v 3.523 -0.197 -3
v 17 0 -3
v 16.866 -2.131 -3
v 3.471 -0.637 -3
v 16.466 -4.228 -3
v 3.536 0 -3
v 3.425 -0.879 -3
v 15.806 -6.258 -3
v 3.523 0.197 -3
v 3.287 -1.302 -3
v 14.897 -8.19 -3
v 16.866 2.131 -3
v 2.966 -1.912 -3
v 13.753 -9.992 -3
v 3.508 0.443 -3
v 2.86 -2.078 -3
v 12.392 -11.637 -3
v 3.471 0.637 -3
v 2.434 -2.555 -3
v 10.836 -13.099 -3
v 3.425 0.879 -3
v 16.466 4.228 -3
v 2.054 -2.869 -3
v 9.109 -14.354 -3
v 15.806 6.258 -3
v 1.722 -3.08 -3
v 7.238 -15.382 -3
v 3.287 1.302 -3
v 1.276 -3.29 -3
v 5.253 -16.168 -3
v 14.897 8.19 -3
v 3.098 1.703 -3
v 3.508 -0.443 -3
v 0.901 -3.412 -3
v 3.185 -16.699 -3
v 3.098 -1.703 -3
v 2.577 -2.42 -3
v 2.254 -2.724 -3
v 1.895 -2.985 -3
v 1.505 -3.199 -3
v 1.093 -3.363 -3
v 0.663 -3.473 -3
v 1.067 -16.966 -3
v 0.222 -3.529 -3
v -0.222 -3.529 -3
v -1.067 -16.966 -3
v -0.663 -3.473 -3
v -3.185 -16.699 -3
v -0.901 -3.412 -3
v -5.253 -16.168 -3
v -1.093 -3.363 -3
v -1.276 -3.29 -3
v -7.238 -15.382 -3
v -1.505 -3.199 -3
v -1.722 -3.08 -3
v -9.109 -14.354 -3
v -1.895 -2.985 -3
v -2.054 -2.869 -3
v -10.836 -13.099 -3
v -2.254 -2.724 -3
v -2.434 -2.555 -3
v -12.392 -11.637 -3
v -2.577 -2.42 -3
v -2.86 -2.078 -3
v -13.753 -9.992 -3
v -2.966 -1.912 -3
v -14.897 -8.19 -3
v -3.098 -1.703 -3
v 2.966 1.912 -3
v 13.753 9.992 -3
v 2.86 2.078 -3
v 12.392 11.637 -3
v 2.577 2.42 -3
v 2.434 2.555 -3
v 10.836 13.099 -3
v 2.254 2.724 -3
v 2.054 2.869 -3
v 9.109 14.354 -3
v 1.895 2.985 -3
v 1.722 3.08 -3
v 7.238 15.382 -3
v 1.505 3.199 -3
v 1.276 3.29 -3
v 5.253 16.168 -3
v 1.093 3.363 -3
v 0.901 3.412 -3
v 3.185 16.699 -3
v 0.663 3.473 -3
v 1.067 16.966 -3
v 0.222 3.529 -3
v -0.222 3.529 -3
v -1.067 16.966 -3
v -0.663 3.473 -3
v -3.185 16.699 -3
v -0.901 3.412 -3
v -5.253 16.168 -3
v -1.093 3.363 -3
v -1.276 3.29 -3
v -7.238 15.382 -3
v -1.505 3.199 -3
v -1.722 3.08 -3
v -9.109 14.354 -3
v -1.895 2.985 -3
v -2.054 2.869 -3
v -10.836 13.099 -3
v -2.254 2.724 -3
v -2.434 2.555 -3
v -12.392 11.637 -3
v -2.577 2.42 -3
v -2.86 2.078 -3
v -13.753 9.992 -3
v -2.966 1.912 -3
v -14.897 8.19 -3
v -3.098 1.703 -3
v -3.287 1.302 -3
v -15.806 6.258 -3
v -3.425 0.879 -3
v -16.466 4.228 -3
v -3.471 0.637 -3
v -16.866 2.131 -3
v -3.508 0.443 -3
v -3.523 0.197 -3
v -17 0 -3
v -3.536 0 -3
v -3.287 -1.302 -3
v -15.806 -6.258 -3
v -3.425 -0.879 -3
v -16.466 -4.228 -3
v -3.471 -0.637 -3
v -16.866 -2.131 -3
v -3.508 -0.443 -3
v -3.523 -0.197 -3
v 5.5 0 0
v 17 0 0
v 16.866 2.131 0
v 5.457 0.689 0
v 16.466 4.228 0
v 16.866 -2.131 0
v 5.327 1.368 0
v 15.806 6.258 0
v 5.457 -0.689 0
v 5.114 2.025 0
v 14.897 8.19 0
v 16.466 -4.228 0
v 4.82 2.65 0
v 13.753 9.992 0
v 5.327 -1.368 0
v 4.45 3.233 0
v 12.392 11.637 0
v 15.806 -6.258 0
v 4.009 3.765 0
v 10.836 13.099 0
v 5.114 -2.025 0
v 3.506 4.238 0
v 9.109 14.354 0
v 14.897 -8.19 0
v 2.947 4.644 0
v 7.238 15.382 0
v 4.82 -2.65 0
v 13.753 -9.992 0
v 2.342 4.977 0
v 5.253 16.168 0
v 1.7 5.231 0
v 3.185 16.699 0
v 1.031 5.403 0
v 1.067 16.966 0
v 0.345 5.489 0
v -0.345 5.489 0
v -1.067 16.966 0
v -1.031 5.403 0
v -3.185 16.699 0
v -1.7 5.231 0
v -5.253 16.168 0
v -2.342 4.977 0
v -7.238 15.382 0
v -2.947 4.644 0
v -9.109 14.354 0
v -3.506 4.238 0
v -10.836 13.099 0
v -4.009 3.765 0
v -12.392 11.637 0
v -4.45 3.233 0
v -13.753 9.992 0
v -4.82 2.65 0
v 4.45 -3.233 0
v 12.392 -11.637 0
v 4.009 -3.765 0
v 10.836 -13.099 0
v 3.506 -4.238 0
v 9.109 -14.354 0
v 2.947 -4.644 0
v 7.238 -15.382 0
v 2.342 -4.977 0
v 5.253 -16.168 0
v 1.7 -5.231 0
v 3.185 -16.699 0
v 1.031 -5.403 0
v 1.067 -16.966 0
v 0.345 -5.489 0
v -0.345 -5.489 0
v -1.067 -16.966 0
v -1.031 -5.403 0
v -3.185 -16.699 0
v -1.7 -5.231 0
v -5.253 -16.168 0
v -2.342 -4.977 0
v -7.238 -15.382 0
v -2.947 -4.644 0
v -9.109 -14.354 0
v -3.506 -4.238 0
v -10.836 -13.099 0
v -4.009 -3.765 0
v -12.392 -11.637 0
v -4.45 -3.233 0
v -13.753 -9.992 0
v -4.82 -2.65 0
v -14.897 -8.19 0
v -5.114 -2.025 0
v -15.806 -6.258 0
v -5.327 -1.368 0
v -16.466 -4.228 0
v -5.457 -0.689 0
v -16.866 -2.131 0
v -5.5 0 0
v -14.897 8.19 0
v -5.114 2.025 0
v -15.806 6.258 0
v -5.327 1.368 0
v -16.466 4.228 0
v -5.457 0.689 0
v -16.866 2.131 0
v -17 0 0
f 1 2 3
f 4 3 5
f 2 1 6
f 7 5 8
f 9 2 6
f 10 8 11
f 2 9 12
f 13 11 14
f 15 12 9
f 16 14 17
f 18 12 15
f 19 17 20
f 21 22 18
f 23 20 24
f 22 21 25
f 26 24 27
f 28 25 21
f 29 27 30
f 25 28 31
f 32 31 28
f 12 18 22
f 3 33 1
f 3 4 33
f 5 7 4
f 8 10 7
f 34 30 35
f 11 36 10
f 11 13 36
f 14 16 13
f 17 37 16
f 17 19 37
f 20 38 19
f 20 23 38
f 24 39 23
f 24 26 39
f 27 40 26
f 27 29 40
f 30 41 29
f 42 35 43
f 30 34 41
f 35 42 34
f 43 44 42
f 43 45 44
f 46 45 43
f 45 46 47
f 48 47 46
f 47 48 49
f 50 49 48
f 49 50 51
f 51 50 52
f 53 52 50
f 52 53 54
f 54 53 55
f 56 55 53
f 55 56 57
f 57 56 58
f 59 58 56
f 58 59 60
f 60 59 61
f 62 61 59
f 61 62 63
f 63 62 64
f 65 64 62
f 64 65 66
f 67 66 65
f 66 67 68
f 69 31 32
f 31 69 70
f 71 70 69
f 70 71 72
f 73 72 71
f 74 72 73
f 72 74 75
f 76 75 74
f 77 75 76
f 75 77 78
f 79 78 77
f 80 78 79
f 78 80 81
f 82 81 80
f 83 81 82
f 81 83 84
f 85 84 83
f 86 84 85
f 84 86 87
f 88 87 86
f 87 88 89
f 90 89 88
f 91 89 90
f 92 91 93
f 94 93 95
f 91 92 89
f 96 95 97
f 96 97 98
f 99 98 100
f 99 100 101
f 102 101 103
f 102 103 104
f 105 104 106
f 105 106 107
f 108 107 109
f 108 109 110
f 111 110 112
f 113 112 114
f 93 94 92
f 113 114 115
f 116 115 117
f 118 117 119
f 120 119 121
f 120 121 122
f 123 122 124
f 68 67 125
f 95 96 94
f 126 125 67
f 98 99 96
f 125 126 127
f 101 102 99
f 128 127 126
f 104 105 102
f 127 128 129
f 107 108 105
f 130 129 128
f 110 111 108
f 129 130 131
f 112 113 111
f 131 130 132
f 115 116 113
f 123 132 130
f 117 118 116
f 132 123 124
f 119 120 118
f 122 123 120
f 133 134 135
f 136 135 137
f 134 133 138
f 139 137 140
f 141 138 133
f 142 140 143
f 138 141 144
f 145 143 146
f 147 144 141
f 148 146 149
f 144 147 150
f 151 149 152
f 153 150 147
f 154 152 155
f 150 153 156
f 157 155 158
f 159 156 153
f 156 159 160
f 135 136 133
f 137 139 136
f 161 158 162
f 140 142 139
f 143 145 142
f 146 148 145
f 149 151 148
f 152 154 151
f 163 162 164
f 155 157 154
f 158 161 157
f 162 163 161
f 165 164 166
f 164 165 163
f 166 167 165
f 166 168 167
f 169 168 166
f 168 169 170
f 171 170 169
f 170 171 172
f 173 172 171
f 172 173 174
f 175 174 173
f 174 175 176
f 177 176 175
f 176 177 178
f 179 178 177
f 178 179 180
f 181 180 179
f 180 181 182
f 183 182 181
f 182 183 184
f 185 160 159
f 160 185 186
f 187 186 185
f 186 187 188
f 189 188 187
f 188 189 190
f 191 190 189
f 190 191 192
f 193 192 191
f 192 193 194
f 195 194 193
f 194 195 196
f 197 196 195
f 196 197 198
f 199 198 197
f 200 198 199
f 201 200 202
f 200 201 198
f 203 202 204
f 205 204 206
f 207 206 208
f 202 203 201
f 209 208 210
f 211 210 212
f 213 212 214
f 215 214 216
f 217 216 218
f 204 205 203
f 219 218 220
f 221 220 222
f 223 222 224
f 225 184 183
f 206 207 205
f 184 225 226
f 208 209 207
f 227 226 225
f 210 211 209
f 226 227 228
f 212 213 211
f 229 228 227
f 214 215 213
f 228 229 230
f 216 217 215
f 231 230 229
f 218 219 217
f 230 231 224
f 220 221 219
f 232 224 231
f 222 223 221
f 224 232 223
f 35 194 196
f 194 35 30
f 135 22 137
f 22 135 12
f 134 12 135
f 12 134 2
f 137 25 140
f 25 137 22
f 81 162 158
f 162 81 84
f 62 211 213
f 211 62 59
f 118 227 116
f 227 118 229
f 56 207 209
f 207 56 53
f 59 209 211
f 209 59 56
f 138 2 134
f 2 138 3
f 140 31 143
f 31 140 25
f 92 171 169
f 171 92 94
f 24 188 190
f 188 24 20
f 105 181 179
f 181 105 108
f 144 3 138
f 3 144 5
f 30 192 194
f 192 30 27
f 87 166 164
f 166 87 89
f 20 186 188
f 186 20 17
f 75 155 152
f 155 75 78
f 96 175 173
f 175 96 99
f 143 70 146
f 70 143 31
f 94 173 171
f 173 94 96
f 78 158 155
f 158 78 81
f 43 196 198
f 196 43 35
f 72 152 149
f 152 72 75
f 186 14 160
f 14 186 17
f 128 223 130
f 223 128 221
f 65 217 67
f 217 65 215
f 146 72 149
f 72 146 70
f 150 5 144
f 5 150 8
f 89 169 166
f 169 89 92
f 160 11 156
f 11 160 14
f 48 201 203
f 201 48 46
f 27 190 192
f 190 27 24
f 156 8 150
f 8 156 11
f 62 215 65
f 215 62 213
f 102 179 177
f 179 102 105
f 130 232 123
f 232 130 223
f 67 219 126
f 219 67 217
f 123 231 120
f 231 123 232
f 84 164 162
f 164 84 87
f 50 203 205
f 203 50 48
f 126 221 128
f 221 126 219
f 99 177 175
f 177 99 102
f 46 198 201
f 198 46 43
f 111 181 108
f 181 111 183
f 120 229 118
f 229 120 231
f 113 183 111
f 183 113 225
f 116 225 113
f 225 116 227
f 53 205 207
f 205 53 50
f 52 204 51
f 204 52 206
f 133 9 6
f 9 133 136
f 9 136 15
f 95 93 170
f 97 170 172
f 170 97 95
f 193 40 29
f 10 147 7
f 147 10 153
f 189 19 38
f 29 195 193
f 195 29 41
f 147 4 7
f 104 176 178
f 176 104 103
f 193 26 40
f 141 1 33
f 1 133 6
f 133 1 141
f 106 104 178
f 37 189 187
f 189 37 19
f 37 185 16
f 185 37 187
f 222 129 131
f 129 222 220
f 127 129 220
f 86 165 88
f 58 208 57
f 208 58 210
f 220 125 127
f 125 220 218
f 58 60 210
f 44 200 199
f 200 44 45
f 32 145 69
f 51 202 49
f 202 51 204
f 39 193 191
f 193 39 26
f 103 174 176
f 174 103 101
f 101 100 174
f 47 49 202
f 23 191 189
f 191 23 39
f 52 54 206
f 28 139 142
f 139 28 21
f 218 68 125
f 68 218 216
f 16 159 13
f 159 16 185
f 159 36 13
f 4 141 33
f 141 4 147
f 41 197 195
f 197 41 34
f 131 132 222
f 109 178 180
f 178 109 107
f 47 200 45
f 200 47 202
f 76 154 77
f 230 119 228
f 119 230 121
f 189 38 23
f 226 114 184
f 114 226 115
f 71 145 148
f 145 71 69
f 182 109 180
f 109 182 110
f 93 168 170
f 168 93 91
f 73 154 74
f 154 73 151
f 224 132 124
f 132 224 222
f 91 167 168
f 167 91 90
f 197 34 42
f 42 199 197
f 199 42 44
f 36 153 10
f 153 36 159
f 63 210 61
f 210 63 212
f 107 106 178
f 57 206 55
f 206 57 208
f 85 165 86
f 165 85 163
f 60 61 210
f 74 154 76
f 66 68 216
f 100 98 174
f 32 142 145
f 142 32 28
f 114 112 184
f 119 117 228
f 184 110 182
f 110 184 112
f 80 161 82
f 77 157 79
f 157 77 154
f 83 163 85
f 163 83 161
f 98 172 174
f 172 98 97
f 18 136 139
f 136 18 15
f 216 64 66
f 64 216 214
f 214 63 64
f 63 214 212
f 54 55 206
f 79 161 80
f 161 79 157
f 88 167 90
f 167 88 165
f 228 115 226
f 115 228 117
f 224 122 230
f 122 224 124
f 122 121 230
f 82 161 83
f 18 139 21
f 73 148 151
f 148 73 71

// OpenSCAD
$fn = 50;


difference() {
	union() {
		translate(v = [0, 0, -3.0000000000]) {
			cylinder(h = 3, r = 7.0000000000);
		}
		translate(v = [0, 0, -3.0000000000]) {
			cylinder(h = 3, r = 17.0000000000);
		}
	}
	union() {
		translate(v = [0, 0, 0]) {
			rotate(a = [0, 0, 0]) {
				difference() {
					union() {
						#translate(v = [0, 0, -3.0000000000]) {
							cylinder(h = 3, r = 2.2500000000);
						}
						#translate(v = [0, 0, -4.2000000000]) {
							cylinder(h = 4.2000000000, r = 7.0000000000, r1 = 2.7500000000, r2 = 5.5000000000);
						}
						#translate(v = [0, 0, -3.0000000000]) {
							cylinder(h = 3, r = 2.7500000000);
						}
						#translate(v = [0, 0, -3.0000000000]) {
							cylinder(h = 3, r = 2.2500000000);
						}
					}
					union();
				}
			}
		}
	}
}
